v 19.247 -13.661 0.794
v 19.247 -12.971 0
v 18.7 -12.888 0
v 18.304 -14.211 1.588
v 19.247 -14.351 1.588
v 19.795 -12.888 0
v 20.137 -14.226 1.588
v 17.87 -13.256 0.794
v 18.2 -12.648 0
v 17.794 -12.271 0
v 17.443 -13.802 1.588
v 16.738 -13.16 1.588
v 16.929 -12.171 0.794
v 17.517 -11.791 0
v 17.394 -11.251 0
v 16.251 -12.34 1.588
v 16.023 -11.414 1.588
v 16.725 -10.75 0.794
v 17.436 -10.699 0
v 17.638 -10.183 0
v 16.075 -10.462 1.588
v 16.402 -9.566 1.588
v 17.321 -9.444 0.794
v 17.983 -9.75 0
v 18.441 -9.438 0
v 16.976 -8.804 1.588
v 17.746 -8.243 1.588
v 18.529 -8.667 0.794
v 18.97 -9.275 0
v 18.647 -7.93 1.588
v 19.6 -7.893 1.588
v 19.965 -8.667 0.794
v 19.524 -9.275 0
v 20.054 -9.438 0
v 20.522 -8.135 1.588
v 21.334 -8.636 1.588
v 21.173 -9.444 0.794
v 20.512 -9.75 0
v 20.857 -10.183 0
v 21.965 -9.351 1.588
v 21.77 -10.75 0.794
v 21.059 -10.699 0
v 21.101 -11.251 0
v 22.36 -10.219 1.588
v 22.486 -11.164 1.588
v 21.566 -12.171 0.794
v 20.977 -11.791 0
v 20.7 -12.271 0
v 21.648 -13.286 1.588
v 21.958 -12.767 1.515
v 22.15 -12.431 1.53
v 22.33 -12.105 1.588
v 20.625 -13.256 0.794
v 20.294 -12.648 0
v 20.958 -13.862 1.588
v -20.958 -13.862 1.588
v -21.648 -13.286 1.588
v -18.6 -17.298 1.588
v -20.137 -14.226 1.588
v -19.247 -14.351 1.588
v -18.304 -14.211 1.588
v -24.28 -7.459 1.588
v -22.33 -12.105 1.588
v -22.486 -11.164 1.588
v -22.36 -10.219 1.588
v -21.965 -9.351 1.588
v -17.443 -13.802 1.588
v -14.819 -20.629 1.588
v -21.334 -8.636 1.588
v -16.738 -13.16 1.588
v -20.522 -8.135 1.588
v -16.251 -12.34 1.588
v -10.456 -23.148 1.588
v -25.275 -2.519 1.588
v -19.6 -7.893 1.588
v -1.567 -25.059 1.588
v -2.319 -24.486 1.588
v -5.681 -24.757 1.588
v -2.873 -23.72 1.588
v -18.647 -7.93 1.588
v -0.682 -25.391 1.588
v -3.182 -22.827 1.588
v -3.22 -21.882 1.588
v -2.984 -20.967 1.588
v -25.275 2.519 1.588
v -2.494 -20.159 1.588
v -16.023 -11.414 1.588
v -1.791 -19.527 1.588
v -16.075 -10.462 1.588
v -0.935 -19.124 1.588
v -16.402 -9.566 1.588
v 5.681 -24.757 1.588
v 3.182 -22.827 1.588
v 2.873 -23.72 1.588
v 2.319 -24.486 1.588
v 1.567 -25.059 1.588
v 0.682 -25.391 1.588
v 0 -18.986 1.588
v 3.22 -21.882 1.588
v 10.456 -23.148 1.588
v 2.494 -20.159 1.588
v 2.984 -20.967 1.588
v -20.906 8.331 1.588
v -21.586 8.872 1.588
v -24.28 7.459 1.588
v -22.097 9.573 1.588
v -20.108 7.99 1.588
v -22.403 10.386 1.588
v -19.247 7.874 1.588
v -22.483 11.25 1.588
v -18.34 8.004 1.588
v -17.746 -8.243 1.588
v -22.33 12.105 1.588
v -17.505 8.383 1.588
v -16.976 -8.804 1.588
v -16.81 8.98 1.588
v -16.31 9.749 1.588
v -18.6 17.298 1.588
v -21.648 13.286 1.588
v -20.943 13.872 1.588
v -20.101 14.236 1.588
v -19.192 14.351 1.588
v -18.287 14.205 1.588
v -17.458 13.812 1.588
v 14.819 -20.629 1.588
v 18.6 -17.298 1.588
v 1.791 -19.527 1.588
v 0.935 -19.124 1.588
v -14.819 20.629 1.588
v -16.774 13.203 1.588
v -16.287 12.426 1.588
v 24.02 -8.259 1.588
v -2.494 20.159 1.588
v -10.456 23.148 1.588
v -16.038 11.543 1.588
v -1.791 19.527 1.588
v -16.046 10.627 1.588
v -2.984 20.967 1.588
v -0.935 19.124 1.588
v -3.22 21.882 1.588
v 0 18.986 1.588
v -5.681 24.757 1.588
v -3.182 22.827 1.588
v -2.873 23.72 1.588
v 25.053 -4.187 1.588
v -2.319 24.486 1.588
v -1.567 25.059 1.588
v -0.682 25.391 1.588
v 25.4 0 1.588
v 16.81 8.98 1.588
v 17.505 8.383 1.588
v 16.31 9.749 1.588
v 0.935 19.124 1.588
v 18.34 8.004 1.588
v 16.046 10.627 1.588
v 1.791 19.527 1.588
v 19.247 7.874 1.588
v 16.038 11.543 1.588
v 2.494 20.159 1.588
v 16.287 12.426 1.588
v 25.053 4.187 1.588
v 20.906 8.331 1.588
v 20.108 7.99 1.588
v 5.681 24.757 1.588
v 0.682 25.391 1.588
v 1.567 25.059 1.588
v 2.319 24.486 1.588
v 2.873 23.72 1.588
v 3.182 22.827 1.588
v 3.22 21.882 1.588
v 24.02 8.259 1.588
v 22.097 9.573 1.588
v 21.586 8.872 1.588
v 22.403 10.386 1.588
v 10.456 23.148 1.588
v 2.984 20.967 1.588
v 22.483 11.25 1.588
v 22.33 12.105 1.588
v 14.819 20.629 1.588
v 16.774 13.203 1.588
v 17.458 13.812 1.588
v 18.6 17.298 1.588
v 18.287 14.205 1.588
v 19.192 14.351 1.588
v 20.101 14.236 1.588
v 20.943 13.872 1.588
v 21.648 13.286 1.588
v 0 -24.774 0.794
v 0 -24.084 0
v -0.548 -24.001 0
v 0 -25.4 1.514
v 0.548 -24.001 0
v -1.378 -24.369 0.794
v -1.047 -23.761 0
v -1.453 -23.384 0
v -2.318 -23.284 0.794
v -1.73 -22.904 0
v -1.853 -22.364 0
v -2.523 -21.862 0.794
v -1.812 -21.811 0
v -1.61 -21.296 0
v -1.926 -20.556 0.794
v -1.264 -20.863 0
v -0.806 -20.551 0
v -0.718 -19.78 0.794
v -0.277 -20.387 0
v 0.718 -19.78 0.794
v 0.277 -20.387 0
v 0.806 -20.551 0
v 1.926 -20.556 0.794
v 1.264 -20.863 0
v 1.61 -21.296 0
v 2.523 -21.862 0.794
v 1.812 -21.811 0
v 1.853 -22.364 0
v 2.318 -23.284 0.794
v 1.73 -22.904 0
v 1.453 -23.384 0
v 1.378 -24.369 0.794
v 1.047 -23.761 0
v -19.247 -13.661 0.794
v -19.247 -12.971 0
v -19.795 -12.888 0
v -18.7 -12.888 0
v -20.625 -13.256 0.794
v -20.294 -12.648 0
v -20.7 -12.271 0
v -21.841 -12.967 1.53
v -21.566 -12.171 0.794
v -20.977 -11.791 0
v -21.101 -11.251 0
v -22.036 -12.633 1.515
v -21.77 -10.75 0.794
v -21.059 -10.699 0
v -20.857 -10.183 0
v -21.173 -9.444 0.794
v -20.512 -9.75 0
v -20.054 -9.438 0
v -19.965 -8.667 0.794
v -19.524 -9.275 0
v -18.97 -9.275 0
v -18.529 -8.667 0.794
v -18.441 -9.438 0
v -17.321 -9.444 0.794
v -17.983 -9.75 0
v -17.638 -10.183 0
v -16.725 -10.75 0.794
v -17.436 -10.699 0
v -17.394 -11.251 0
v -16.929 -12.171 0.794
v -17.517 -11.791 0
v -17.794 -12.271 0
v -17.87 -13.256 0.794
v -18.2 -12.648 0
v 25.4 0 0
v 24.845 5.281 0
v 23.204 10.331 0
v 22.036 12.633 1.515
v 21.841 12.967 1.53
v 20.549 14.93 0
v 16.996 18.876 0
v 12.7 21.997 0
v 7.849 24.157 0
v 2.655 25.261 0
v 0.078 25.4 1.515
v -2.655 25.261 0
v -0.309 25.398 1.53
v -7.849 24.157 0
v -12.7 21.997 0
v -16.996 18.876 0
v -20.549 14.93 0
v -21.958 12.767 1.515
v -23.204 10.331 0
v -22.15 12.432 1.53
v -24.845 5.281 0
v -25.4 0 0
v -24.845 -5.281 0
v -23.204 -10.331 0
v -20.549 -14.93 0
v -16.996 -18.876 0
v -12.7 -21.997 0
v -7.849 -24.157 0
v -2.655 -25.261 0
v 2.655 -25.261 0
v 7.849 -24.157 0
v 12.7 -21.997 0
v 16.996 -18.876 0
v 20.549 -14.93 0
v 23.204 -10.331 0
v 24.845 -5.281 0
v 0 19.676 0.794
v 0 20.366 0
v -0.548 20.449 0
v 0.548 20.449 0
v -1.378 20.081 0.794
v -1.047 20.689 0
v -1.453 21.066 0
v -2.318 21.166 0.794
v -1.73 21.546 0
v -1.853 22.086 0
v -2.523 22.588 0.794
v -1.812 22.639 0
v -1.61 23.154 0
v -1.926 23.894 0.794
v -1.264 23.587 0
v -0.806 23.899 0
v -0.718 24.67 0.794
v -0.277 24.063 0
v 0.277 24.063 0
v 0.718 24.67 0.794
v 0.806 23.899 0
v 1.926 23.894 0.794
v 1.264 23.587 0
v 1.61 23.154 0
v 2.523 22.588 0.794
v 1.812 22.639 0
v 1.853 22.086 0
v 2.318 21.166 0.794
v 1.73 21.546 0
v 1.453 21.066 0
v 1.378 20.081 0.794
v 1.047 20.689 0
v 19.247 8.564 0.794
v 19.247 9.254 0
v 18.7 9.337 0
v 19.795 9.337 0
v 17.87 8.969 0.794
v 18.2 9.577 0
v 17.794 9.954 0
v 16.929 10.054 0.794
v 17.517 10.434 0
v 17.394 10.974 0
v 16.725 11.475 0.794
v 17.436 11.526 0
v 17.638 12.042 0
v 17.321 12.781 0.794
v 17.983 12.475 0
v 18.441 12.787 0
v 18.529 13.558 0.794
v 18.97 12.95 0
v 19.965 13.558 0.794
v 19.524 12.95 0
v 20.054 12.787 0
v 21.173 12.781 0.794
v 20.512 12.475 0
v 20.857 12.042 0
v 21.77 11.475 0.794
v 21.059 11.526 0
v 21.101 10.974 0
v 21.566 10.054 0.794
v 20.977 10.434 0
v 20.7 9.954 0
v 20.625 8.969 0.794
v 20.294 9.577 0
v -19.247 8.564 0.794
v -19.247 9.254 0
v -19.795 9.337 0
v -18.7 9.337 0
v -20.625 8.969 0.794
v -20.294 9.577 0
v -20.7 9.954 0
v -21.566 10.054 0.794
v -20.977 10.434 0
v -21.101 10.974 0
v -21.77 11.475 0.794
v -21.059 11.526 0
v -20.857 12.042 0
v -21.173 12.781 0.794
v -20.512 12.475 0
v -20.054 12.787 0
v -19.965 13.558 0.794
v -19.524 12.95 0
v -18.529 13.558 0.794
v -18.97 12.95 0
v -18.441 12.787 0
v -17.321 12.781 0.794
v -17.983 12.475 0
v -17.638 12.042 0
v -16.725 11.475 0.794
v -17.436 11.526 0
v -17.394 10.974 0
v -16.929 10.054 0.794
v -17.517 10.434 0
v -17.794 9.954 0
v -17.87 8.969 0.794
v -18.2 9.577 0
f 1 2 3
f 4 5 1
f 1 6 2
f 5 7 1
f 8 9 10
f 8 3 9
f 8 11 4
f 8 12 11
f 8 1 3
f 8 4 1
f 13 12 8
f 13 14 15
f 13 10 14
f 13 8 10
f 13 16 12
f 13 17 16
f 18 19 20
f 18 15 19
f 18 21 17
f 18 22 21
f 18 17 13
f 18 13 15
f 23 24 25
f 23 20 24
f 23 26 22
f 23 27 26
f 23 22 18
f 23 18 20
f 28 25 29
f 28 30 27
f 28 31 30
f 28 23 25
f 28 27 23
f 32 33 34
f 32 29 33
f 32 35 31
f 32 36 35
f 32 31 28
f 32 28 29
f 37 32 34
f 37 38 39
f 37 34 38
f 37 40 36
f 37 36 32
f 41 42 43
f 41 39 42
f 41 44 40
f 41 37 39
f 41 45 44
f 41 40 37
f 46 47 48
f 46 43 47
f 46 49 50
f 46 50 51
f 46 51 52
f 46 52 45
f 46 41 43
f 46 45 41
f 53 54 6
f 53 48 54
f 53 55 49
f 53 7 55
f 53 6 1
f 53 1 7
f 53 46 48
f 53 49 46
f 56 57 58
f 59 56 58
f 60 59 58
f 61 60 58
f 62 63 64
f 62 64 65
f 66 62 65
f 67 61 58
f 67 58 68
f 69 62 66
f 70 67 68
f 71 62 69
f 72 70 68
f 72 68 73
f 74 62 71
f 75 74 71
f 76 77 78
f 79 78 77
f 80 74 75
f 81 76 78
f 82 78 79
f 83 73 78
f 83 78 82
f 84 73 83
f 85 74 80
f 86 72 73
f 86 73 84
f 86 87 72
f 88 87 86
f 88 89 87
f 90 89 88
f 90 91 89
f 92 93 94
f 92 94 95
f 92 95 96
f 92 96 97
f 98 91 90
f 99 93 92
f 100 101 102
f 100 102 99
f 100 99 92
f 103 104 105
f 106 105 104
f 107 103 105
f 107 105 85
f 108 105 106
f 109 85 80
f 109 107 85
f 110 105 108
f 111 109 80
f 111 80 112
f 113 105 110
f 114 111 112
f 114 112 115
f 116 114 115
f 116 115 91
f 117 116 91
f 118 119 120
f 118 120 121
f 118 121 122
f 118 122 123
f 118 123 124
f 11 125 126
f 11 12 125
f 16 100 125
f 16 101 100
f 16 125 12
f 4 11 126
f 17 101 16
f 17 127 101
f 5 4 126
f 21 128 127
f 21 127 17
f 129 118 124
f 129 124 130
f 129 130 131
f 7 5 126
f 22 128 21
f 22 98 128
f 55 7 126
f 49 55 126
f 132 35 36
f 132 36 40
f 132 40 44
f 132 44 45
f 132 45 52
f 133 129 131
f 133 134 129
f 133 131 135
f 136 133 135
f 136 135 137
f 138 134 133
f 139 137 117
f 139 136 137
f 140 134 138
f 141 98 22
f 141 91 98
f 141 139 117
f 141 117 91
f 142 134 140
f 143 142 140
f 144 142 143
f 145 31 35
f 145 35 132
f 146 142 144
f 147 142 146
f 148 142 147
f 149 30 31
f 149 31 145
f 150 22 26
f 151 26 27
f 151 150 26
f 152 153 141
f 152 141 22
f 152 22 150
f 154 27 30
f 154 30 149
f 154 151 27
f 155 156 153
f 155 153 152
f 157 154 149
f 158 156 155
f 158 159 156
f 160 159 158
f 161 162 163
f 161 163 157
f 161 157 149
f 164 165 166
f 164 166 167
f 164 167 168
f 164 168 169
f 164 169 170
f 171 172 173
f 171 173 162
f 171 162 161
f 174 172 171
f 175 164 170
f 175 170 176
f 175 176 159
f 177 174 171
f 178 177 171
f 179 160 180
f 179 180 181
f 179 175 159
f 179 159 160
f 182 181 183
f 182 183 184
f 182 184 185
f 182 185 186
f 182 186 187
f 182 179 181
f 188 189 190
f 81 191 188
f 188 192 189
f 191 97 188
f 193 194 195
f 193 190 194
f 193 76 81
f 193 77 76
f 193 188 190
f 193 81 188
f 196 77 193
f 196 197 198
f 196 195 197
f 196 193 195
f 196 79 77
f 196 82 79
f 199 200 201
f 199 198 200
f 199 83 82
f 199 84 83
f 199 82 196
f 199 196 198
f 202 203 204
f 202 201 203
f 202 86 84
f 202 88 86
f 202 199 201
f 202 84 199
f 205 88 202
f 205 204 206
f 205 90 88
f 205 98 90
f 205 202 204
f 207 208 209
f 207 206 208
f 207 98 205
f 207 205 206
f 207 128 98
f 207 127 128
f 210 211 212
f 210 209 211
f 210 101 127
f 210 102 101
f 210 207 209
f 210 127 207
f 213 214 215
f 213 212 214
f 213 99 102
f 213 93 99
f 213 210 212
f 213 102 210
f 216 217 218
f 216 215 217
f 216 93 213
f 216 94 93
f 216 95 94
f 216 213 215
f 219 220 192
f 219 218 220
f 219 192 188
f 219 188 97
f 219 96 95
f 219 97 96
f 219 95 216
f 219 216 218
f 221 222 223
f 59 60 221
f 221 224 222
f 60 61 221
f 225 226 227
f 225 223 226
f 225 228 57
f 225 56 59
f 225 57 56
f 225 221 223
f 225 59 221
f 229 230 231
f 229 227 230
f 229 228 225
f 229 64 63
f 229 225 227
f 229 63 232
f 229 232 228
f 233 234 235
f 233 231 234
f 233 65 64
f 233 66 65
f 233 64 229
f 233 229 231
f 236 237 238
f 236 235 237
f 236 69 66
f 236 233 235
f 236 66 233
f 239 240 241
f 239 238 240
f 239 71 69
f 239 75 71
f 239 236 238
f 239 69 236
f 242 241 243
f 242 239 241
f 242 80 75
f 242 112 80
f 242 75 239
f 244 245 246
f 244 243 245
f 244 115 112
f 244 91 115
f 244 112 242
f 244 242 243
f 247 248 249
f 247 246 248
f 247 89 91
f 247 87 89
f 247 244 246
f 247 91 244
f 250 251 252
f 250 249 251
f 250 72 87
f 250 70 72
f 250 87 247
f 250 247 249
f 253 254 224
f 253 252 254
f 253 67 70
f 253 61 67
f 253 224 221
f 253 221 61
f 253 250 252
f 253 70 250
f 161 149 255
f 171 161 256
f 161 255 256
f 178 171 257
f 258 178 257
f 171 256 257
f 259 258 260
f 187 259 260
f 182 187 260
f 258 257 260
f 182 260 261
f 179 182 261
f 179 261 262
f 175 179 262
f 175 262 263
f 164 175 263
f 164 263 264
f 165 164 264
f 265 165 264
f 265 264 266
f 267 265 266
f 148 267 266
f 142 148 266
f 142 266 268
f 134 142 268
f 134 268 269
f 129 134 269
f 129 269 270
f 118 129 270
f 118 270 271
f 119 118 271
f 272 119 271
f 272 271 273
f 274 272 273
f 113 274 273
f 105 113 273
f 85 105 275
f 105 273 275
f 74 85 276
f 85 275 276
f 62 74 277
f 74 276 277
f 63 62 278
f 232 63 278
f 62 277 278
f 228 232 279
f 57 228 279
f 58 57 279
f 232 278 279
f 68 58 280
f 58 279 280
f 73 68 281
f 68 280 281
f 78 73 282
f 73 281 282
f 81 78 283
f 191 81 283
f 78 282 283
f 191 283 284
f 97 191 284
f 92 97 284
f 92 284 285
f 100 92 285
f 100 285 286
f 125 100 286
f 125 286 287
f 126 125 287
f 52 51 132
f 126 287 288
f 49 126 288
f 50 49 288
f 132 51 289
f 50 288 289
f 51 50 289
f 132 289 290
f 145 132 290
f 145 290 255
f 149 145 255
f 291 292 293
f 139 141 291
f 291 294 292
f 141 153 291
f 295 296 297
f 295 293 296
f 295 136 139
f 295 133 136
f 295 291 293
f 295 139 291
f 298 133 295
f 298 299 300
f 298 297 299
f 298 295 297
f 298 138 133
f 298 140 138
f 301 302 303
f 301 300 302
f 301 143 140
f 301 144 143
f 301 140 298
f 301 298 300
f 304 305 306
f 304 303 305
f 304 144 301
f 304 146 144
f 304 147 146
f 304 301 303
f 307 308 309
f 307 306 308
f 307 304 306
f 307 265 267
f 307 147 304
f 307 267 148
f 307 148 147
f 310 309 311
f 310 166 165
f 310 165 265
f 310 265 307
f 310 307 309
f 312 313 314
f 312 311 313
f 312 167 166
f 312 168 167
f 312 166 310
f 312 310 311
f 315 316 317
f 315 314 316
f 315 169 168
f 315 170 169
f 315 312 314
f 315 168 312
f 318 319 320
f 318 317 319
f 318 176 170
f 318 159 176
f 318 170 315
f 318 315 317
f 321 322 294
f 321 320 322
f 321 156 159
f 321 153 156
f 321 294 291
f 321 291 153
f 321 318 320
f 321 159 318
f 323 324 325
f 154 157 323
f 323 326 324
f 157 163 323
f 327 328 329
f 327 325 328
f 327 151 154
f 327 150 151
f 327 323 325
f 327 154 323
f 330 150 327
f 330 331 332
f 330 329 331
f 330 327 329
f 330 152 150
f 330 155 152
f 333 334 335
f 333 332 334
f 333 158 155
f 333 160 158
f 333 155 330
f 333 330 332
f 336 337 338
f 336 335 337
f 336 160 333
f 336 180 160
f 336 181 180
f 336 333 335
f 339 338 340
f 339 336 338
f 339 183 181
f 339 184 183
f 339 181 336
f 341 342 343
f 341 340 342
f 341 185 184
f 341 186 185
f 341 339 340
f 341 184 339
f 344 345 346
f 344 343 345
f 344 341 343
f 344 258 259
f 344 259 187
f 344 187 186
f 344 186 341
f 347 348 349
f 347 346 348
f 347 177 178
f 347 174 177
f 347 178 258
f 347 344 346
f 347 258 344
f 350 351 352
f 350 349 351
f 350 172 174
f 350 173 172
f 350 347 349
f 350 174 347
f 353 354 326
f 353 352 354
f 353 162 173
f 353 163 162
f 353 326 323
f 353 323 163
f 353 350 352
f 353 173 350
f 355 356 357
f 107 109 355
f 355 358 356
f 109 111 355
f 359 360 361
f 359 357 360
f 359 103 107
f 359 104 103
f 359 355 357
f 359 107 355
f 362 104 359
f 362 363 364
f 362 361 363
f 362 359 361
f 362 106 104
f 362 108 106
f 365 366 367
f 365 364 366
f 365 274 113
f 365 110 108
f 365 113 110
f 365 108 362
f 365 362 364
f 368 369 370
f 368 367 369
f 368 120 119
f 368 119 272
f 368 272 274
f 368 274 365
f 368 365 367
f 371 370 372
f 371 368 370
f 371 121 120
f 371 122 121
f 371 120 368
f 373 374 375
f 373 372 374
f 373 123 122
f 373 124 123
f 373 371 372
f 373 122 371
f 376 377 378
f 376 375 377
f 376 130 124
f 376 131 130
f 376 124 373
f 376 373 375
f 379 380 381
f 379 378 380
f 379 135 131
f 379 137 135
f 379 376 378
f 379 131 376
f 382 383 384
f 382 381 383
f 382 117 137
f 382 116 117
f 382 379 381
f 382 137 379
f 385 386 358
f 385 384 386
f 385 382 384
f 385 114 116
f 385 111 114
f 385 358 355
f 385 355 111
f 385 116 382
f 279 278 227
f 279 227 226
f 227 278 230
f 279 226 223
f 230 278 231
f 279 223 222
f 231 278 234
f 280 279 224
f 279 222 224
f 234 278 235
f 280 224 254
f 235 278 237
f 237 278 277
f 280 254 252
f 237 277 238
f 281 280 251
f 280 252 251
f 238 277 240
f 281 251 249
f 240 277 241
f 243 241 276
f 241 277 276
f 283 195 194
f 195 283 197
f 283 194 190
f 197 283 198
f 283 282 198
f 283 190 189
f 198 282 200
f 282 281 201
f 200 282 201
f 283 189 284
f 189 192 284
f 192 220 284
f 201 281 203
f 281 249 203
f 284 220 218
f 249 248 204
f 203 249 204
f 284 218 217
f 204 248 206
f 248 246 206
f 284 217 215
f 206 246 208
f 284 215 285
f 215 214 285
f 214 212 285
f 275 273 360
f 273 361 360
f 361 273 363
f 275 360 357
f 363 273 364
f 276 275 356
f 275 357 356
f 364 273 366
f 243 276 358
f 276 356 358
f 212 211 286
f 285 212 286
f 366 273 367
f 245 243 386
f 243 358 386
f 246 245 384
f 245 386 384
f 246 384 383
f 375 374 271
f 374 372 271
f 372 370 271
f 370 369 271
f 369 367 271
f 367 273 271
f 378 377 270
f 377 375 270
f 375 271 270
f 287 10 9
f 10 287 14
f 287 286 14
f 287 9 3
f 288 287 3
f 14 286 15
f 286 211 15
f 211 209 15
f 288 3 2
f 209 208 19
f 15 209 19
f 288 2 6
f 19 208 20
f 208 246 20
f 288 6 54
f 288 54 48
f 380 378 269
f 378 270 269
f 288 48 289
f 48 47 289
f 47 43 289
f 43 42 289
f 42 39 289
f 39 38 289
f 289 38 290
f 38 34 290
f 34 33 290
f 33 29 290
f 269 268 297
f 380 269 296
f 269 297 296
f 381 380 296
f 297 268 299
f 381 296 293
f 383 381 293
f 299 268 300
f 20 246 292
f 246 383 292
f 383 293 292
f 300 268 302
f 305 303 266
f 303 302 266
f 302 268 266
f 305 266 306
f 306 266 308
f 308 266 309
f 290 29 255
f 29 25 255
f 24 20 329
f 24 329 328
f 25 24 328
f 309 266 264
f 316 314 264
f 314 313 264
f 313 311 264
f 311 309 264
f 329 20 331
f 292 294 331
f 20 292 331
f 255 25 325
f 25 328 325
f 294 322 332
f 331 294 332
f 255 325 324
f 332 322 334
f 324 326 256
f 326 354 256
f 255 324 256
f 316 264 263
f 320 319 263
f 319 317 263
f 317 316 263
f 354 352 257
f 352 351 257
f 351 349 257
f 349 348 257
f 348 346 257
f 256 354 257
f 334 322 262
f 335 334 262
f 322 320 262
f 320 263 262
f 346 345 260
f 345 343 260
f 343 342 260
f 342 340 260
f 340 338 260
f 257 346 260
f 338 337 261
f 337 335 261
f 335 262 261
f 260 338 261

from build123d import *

# Parameters (mm, degrees)
SKETCH1_R                                     = 25.4
BOSS_EXTRUDE1_DEPTH                           = 1.5875
CSK_FOR_4_FLAT_HEAD_SOCKET_CAP_SCREW1_A_COUNT = 2
CSK_FOR_4_FLAT_HEAD_SOCKET_CAP_SCREW1_A_PITCH = 22.225
CSK_FOR_4_FLAT_HEAD_SOCKET_CAP_SCRE_2_COUNT   = 2
CSK_FOR_4_FLAT_HEAD_SOCKET_CAP_SCRE_2_PITCH   = 38.494829198
CSK_FOR_4_FLAT_HEAD_SOCKET_CAP_SCRE_3_COUNT   = 2
CSK_FOR_4_FLAT_HEAD_SOCKET_CAP_SCRE_3_PITCH   = 44.45
CSK_FOR_4_FLAT_HEAD_SOCKET_CAP_SCRE_4_COUNT   = 2
CSK_FOR_4_FLAT_HEAD_SOCKET_CAP_SCRE_4_PITCH   = 38.494829198
CSK_FOR_4_FLAT_HEAD_SOCKET_CAP_SCRE_5_COUNT   = 2
CSK_FOR_4_FLAT_HEAD_SOCKET_CAP_SCRE_5_PITCH   = 22.225


with BuildPart() as part:
    # Sketch1 → Boss-Extrude1 (new body)
    with BuildSketch(Plane.XY):
        Circle(SKETCH1_R)
    extrude(amount=BOSS_EXTRUDE1_DEPTH)

    # Sketch3 → CSK for #4 Flat Head Socket Cap Screw1 (revolve, cut)
    with BuildSketch(Plane(origin=(0, 22.225, 1.5875), x_dir=(0, -1, 0), z_dir=(1, 0, 0))):
        Polygon((0, 0), (0, 1.5875), (1.63195, 1.5875), (1.63195, 1.848124365), (3.2385, 0), align=None)
    csk_for_4_flat_head_socket_cap_screw1 = revolve(axis=Axis((0, 22.225, 7.9375), (0, 0, -1)), mode=Mode.SUBTRACT)

    # CSK for #4 Flat Head Socket Cap Screw1 a: CSK for #4 Flat Head Socket Cap Screw1 ×2
    with Locations(*[Vector(0.866025403784438, -0.500000000000001, 0) * (i * CSK_FOR_4_FLAT_HEAD_SOCKET_CAP_SCREW1_A_PITCH) for i in range(1, CSK_FOR_4_FLAT_HEAD_SOCKET_CAP_SCREW1_A_COUNT)]):
        add(csk_for_4_flat_head_socket_cap_screw1, mode=Mode.SUBTRACT)

    # CSK for _4 Flat Head Socket Cap Scre 2: CSK for #4 Flat Head Socket Cap Screw1 ×2
    with Locations(*[Vector(0.5000000000000123, -0.8660254037844316, 0) * (i * CSK_FOR_4_FLAT_HEAD_SOCKET_CAP_SCRE_2_PITCH) for i in range(1, CSK_FOR_4_FLAT_HEAD_SOCKET_CAP_SCRE_2_COUNT)]):
        add(csk_for_4_flat_head_socket_cap_screw1, mode=Mode.SUBTRACT)

    # CSK for _4 Flat Head Socket Cap Scre 3: CSK for #4 Flat Head Socket Cap Screw1 ×2
    with Locations(*[(0, -i * CSK_FOR_4_FLAT_HEAD_SOCKET_CAP_SCRE_3_PITCH, 0) for i in range(1, CSK_FOR_4_FLAT_HEAD_SOCKET_CAP_SCRE_3_COUNT)]):
        add(csk_for_4_flat_head_socket_cap_screw1, mode=Mode.SUBTRACT)

    # CSK for _4 Flat Head Socket Cap Scre 4: CSK for #4 Flat Head Socket Cap Screw1 ×2
    with Locations(*[Vector(-0.4999999999999876, -0.8660254037844458, 0) * (i * CSK_FOR_4_FLAT_HEAD_SOCKET_CAP_SCRE_4_PITCH) for i in range(1, CSK_FOR_4_FLAT_HEAD_SOCKET_CAP_SCRE_4_COUNT)]):
        add(csk_for_4_flat_head_socket_cap_screw1, mode=Mode.SUBTRACT)

    # CSK for _4 Flat Head Socket Cap Scre 5: CSK for #4 Flat Head Socket Cap Screw1 ×2
    with Locations(*[Vector(-0.8660254037844416, -0.49999999999999495, 0) * (i * CSK_FOR_4_FLAT_HEAD_SOCKET_CAP_SCRE_5_PITCH) for i in range(1, CSK_FOR_4_FLAT_HEAD_SOCKET_CAP_SCRE_5_COUNT)]):
        add(csk_for_4_flat_head_socket_cap_screw1, mode=Mode.SUBTRACT)


solid = part.part
